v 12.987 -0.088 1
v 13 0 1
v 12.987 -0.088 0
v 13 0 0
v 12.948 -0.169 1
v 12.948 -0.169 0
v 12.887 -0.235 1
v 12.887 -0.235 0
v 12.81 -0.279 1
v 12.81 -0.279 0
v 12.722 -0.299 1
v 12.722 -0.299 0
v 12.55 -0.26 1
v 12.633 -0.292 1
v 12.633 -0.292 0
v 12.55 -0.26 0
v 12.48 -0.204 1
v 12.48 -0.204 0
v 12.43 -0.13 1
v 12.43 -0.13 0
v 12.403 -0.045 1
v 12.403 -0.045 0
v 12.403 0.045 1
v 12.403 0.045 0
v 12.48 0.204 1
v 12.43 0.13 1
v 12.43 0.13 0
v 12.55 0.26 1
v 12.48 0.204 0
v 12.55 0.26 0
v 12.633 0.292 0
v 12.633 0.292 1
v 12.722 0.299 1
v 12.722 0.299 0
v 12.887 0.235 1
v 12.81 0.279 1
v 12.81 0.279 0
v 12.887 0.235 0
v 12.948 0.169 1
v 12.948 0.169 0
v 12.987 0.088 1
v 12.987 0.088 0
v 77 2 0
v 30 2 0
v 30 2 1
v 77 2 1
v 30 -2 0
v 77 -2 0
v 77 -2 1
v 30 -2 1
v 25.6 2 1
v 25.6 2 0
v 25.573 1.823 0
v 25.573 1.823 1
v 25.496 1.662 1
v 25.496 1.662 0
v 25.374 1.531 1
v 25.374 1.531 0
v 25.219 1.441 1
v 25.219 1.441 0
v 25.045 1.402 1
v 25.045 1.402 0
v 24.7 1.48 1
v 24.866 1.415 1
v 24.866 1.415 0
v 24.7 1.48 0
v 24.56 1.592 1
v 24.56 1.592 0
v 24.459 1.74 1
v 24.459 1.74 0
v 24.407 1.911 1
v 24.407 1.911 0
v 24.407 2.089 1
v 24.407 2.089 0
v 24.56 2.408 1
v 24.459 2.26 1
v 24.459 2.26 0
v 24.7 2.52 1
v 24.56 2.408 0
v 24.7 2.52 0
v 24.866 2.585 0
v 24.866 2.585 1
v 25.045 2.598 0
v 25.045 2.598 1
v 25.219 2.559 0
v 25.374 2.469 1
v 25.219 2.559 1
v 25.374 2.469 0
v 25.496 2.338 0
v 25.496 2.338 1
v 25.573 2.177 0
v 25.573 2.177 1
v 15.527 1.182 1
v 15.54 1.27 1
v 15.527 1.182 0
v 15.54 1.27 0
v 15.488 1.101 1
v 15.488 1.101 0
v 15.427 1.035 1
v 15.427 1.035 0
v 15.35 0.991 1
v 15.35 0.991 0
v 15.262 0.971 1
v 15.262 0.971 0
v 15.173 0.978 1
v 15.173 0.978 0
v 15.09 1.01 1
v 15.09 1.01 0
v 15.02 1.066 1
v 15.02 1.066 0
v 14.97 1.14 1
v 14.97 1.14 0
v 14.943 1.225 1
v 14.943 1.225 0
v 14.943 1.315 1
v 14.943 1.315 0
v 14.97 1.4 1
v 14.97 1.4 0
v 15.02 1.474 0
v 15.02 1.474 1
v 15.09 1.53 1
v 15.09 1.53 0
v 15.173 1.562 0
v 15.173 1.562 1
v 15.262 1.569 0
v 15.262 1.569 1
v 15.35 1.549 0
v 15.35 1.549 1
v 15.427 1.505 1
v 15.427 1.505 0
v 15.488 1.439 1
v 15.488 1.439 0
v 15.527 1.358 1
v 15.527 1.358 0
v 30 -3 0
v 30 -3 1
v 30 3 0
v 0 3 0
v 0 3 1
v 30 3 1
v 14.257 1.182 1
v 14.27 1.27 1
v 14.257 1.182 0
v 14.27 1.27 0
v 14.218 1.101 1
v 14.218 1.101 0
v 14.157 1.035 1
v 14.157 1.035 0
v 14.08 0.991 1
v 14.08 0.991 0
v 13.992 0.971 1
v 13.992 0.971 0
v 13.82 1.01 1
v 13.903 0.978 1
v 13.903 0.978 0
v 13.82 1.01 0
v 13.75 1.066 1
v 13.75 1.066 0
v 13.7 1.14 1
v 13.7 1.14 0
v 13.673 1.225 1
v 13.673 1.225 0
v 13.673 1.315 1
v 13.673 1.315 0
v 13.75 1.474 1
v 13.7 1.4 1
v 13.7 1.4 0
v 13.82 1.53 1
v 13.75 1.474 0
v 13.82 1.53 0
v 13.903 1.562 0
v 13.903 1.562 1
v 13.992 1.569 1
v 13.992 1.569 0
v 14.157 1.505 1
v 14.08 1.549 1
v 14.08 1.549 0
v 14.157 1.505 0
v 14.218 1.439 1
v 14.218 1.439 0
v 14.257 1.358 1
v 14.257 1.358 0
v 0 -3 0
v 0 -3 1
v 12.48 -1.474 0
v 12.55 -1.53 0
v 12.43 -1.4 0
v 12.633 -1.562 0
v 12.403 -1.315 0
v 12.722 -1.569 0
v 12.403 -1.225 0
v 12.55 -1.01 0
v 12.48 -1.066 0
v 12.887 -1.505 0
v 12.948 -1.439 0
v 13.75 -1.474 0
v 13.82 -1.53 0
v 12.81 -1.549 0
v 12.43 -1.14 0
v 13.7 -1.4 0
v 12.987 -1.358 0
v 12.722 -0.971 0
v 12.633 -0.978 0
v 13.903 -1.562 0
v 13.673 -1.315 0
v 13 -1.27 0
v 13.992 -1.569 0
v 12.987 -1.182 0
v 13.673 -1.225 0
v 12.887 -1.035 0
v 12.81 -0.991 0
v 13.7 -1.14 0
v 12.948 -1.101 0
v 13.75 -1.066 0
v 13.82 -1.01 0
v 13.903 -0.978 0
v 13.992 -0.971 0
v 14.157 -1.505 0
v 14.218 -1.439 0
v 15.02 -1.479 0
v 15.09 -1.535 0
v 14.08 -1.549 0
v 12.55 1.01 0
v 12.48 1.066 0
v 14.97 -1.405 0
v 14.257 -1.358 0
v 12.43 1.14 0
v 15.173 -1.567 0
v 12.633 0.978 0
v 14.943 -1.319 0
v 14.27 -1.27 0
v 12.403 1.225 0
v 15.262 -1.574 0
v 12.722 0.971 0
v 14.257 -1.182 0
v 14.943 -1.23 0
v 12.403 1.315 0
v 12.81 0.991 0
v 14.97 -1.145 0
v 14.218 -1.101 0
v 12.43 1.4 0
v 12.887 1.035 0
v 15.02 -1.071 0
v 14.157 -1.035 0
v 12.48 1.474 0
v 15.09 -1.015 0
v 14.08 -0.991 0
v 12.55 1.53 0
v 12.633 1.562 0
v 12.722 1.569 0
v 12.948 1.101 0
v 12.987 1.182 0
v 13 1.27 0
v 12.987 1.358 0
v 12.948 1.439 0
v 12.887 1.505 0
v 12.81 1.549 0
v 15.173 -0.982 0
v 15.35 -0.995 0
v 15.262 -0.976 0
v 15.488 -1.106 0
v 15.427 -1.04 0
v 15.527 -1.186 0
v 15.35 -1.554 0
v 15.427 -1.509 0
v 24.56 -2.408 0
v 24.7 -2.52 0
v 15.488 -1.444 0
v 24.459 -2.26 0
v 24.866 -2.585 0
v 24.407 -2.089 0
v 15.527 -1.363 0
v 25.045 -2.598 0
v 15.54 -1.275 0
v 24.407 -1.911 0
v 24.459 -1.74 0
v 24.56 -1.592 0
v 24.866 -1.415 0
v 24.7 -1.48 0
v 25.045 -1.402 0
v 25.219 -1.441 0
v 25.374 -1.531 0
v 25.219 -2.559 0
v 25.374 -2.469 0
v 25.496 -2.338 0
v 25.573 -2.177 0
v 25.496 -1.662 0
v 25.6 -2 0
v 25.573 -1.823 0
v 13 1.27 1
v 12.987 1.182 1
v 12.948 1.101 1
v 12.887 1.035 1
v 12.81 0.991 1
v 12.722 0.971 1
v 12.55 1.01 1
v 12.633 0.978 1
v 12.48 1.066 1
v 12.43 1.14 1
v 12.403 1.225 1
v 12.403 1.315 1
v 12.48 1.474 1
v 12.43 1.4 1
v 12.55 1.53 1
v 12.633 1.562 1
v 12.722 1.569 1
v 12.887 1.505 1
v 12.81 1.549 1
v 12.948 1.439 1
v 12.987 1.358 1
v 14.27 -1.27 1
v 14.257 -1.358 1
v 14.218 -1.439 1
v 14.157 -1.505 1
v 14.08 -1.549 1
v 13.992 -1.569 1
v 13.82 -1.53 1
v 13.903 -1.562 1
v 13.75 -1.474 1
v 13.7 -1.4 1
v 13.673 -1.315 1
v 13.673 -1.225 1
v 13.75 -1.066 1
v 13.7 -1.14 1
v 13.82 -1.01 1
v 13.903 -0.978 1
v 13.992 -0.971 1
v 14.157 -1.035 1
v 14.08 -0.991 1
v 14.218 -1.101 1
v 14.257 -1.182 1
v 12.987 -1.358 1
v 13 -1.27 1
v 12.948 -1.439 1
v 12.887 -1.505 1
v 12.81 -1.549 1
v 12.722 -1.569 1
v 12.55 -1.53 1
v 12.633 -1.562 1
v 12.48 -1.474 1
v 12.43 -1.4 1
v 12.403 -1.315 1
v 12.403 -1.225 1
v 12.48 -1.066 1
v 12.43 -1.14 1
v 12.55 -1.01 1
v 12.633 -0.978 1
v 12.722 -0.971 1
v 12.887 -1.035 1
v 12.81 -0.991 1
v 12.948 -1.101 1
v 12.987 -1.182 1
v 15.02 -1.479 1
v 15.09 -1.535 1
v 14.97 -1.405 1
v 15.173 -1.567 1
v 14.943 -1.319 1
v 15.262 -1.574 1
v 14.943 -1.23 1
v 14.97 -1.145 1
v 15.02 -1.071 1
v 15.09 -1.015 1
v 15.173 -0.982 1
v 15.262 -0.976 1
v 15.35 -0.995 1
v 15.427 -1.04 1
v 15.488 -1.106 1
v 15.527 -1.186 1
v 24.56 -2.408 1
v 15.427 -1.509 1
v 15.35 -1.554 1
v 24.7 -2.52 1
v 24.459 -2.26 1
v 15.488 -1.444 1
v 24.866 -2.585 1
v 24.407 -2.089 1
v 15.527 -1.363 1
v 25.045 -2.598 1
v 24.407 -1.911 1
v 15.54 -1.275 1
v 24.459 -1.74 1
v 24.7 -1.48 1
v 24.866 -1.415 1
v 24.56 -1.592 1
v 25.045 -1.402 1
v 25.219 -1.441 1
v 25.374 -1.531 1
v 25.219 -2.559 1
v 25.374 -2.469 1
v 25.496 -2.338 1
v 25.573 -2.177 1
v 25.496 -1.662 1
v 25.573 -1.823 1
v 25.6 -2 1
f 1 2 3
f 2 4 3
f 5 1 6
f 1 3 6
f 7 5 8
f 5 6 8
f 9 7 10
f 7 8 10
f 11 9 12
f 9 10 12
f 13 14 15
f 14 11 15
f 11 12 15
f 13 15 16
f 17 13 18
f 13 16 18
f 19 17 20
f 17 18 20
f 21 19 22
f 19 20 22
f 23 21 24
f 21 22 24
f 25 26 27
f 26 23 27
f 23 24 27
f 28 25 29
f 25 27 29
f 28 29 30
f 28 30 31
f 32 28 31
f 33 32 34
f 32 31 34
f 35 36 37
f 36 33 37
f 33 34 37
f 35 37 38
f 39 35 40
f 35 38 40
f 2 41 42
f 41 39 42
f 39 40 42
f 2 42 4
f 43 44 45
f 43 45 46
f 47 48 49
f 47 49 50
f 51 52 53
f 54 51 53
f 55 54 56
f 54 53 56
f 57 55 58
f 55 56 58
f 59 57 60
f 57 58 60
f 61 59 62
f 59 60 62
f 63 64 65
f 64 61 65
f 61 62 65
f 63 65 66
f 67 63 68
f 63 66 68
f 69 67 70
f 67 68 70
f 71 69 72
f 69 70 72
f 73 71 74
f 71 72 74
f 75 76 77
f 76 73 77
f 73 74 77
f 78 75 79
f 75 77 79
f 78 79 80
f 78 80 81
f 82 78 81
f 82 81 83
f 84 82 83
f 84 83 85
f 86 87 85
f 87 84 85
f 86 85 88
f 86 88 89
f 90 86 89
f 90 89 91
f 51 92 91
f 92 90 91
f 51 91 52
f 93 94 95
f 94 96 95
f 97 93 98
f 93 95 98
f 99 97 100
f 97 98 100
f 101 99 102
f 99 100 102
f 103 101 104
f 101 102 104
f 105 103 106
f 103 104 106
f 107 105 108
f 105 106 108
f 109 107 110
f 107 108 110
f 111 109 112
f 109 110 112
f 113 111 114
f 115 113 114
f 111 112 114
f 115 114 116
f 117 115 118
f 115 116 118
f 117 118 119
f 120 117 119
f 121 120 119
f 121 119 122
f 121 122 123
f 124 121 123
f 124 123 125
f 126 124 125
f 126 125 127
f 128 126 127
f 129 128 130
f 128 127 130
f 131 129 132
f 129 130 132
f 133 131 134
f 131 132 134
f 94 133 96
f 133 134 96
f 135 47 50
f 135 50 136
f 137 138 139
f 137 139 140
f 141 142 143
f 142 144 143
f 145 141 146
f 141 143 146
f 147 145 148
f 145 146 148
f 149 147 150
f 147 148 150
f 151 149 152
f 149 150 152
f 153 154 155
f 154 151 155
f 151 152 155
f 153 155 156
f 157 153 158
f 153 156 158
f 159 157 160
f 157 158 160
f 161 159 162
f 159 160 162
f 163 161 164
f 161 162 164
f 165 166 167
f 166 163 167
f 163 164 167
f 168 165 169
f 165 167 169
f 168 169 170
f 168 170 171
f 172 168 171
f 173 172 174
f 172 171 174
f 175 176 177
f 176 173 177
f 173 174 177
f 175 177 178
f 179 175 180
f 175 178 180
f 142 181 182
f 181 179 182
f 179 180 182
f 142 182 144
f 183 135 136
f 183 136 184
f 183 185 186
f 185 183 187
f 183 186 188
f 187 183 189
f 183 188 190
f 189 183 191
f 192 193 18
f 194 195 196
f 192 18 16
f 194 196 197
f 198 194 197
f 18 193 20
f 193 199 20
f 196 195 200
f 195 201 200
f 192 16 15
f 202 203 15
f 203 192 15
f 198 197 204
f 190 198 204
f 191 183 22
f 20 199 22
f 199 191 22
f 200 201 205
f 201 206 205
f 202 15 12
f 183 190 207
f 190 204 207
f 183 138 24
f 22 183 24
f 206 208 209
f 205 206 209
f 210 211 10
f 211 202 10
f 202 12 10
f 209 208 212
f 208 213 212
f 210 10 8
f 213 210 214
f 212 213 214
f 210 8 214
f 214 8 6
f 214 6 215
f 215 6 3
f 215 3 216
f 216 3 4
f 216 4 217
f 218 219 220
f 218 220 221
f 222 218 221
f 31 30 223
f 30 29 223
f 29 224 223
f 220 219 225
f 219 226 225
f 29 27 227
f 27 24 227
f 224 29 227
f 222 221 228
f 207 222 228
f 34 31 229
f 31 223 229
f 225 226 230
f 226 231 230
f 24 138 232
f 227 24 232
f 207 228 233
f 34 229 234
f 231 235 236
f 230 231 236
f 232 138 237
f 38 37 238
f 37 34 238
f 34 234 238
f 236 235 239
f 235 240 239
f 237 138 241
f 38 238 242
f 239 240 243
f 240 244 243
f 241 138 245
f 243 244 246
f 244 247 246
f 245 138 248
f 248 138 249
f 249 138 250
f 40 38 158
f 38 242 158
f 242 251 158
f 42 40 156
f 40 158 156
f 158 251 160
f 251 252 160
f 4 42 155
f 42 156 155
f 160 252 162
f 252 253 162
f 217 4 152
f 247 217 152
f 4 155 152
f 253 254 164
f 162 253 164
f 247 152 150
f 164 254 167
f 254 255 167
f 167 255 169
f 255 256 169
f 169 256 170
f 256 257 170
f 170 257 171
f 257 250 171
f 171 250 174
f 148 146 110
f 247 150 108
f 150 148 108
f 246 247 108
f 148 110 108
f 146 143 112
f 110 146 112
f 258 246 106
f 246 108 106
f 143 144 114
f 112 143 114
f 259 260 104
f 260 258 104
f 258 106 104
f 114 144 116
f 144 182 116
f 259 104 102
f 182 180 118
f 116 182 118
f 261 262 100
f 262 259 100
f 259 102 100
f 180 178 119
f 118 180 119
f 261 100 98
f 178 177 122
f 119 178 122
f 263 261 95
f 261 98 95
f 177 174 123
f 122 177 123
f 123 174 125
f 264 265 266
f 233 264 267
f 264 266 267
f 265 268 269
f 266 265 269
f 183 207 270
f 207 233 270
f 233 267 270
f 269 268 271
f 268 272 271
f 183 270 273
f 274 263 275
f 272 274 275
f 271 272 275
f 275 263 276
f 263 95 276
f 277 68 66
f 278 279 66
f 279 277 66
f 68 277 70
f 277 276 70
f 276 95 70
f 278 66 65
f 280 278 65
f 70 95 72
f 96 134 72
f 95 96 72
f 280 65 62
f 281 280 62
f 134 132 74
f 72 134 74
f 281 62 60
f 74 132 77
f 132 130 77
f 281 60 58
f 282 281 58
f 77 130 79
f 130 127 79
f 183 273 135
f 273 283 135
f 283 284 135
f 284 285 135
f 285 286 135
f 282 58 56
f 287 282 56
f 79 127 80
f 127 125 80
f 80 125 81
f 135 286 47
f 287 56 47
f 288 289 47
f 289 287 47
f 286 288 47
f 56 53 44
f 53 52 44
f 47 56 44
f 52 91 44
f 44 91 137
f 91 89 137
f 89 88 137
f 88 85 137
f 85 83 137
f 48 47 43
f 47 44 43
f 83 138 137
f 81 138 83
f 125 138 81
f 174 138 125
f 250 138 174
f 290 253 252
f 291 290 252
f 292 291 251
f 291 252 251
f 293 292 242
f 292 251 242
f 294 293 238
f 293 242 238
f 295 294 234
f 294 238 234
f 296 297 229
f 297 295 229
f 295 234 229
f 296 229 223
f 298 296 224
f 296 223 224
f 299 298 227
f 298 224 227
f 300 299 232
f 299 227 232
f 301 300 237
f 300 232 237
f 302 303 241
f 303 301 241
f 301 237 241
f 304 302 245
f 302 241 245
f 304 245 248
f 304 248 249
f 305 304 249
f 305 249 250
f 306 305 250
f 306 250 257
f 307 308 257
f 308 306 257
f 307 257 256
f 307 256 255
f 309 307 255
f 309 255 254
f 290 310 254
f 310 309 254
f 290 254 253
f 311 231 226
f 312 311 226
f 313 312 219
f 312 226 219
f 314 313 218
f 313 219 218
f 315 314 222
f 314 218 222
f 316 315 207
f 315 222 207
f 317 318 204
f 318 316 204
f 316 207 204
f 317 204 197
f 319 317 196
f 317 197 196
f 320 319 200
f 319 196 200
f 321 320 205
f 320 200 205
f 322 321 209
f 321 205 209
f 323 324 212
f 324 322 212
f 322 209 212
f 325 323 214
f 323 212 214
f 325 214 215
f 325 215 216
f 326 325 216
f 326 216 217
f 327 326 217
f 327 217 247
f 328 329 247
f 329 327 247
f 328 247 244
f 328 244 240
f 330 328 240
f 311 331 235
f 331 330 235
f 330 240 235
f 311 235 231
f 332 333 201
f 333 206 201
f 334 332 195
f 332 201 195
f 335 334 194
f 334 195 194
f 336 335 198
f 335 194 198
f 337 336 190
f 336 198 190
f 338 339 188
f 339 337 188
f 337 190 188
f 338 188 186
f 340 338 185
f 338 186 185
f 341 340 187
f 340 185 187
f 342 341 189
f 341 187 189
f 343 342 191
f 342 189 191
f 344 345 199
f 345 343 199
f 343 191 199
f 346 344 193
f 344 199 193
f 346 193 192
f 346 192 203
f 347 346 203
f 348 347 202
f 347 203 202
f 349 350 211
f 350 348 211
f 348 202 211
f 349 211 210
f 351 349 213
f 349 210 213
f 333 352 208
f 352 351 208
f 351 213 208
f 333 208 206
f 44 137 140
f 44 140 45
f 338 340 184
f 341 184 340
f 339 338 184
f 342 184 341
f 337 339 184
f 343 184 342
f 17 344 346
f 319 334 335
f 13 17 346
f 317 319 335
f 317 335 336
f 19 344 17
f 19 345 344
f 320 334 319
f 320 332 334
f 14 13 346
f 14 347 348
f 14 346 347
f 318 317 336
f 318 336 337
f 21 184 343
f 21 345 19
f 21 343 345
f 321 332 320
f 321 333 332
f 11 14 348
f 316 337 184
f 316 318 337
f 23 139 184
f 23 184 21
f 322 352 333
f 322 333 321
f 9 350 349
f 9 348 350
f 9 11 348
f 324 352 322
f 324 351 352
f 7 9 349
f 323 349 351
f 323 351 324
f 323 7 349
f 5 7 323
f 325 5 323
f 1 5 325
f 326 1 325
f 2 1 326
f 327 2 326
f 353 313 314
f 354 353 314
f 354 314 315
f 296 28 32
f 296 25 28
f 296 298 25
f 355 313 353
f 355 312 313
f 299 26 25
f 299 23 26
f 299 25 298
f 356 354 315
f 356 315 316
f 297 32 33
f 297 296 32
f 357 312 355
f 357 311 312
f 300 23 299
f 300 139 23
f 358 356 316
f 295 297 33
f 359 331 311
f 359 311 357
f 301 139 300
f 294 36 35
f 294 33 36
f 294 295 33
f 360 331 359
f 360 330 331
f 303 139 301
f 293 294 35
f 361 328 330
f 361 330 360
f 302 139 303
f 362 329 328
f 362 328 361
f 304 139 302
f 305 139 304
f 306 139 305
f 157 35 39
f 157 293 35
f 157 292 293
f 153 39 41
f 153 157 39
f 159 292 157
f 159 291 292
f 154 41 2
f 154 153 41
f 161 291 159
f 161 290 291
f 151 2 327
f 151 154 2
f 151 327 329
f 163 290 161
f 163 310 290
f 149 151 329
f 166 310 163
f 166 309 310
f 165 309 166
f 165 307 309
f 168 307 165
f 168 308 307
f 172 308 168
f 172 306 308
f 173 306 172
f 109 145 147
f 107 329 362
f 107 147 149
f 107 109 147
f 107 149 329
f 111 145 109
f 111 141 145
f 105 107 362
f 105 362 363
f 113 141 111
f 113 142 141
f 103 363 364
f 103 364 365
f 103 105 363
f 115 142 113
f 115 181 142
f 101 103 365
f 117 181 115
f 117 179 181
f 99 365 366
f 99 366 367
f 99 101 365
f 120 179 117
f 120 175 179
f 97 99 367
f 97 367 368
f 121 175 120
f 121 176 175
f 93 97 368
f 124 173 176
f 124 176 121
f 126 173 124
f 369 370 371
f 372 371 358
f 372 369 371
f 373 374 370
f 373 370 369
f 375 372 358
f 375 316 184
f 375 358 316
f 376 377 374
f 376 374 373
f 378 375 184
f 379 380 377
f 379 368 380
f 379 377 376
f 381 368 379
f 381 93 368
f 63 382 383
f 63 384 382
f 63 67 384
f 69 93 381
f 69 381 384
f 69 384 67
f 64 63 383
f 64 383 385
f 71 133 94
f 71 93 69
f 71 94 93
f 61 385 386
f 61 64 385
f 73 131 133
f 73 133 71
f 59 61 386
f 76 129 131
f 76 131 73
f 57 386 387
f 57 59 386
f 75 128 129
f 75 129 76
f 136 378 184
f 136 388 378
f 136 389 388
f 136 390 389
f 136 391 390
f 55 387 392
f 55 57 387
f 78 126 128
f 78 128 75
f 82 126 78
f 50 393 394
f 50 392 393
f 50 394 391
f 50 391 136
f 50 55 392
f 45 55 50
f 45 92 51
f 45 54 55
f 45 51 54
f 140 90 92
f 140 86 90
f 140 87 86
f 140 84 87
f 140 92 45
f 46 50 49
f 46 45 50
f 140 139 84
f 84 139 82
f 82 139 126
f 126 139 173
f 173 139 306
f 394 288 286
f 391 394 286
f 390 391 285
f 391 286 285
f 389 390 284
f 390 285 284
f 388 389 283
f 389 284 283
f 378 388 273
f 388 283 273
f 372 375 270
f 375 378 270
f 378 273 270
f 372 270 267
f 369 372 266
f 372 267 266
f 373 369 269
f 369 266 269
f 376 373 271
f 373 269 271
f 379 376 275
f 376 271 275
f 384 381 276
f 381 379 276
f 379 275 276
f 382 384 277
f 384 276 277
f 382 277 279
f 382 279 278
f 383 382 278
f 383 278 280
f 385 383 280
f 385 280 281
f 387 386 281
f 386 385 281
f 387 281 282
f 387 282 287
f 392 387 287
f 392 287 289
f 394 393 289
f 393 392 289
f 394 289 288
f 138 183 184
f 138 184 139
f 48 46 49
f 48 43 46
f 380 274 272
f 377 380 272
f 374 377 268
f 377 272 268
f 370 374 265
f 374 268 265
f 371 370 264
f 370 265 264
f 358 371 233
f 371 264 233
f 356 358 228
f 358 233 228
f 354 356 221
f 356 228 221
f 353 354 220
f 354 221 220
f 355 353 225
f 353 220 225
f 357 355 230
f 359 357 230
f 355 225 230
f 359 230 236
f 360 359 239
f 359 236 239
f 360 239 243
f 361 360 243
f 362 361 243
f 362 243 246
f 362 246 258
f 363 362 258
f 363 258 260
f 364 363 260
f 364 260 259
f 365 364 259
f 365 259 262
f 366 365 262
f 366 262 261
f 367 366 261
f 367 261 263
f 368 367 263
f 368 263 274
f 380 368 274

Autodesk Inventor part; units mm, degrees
ref_plane "YZ Plane" through (0, 0, 0) normal (1, 0, 0) x (0, 1, 0)
ref_plane "XZ Plane" through (0, 0, 0) normal (0, 1, 0) x (-1, 0, 0)
ref_plane "XY Plane" through (0, 0, 0) normal (0, 0, 1) x (1, 0, 0)
sketch "Skizze1" plane through (0, 0, 0) normal (0, 0, 1) x (1, 0, 0)
  line L0 (0, 3) -> (30, 3)
  arc A0 (30, 2.9625) -> (30, 3.0375) centre (30, 3) ccw
  arc A1 (0, 3.0375) -> (0, 2.9625) centre (0, 3) ccw
  line L1 (30, 3) -> (30, 2)
  line L2 (30, 2) -> (77, 2)
  line L3 (77, 2) -> (77, -2)
  line L4 (77, -2) -> (30, -2)
  line L5 (30, -2) -> (30, -3)
  line L6 (0, -3) -> (0, 3)
  circle A2 centre (25, -2) radius 0.6
  line L7 (30, -3) -> (0, -3)
  arc A3 (0, -3.0325) -> (0, -2.9675) centre (0, -3) ccw
  arc A4 (0, 2.9675) -> (0, 3.0325) centre (0, 3) ccw
  arc A5 (-0.0325, 3) -> (0.0325, 3) centre (0, 3) ccw
  arc A6 (29.9675, 3) -> (30.0325, 3) centre (30, 3) ccw
  arc A7 (29.9675, 2) -> (30.0325, 2) centre (30, 2) ccw
  arc A8 (76.9675, 2) -> (77.0325, 2) centre (77, 2) ccw
  arc A9 (77, 2.0325) -> (77, 1.9675) centre (77, 2) ccw
  arc A10 (77, -1.9675) -> (77, -2.0325) centre (77, -2) ccw
  arc A11 (30, -1.9675) -> (30, -2.0325) centre (30, -2) ccw
  arc A12 (30, -2.9675) -> (30, -3.0325) centre (30, -3) ccw
  circle A13 centre (25, 2) radius 0.6
  arc A14 (25, 1.6492) -> (25, 2.3508) centre (25, 2) ccw
  arc A15 (25, 2.3508) -> (25, 1.6492) centre (25, 2) ccw
  arc A16 (25, -2.3508) -> (25, -1.6492) centre (25, -2) ccw
  arc A17 (25, -1.6492) -> (25, -2.3508) centre (25, -2) ccw
  arc A18 (25, 1.6492) -> (25, 2.3508) centre (25, 2) ccw
  arc A19 (25, 2.3508) -> (25, 1.6492) centre (25, 2) ccw
  arc A20 (25, -2.3508) -> (25, -1.6492) centre (25, -2) ccw
  arc A21 (25, -1.6492) -> (25, -2.3508) centre (25, -2) ccw
  circle A22 centre (12.7, 1.27) radius 0.3
  circle A23 centre (12.7, 0) radius 0.3
  circle A24 centre (12.7, -1.27) radius 0.3
  circle A25 centre (13.97, 1.27) radius 0.3
  circle A26 centre (13.97, -1.27) radius 0.3
  arc A27 (35.0325, 0) -> (34.9675, 0) centre (35, 0) ccw
  arc A28 (72.0325, 0) -> (71.9675, 0) centre (72, 0) ccw
  arc A29 (35.0325, 0) -> (34.9675, 0) centre (35, 0) ccw
  arc A30 (30.0325, -2) -> (29.9675, -2) centre (30, -2) ccw
  line L8 (35, 0) -> (72, 0)
  line L9 (12.1968, -0.5032) -> (13.2032, -0.5032)
  line L10 (13.2032, -0.5032) -> (13.2032, 0.5032)
  line L11 (13.2032, 0.5032) -> (12.1968, 0.5032)
  line L12 (12.1968, 0.5032) -> (12.1968, -0.5032)
  line L13 (12.1968, -0.5032) -> (13.2032, -0.5032)
  line L14 (13.2032, -0.5032) -> (13.2032, 0.5032)
  line L15 (13.2032, 0.5032) -> (12.1968, 0.5032)
  line L16 (12.1968, 0.5032) -> (12.1968, -0.5032)
  line L17 (12.0952, -0.6048) -> (13.3048, -0.6048)
  line L18 (13.3048, -0.6048) -> (13.3048, 0.6048)
  line L19 (13.3048, 0.6048) -> (12.0952, 0.6048)
  line L20 (12.0952, 0.6048) -> (12.0952, -0.6048)
  line L21 (12.0952, -0.6048) -> (13.3048, -0.6048)
  line L22 (13.3048, -0.6048) -> (13.3048, 0.6048)
  line L23 (13.3048, 0.6048) -> (12.0952, 0.6048)
  line L24 (12.0952, 0.6048) -> (12.0952, -0.6048)
  line L25 (12.1968, -1.7732) -> (13.2032, -1.7732)
  line L26 (13.2032, -1.7732) -> (13.2032, -0.7668)
  line L27 (13.2032, -0.7668) -> (12.1968, -0.7668)
  line L28 (12.1968, -0.7668) -> (12.1968, -1.7732)
  line L29 (12.1968, -1.7732) -> (13.2032, -1.7732)
  line L30 (13.2032, -1.7732) -> (13.2032, -0.7668)
  line L31 (13.2032, -0.7668) -> (12.1968, -0.7668)
  line L32 (12.1968, -0.7668) -> (12.1968, -1.7732)
  line L33 (12.0952, -1.8748) -> (13.3048, -1.8748)
  line L34 (13.3048, -1.8748) -> (13.3048, -0.6652)
  line L35 (13.3048, -0.6652) -> (12.0952, -0.6652)
  line L36 (12.0952, -0.6652) -> (12.0952, -1.8748)
  line L37 (12.0952, -1.8748) -> (13.3048, -1.8748)
  line L38 (13.3048, -1.8748) -> (13.3048, -0.6652)
  line L39 (13.3048, -0.6652) -> (12.0952, -0.6652)
  line L40 (12.0952, -0.6652) -> (12.0952, -1.8748)
  line L41 (13.4668, 0.7668) -> (14.4732, 0.7668)
  line L42 (14.4732, 0.7668) -> (14.4732, 1.7732)
  line L43 (14.4732, 1.7732) -> (13.4668, 1.7732)
  line L44 (13.4668, 1.7732) -> (13.4668, 0.7668)
  line L45 (13.4668, 0.7668) -> (14.4732, 0.7668)
  line L46 (14.4732, 0.7668) -> (14.4732, 1.7732)
  line L47 (14.4732, 1.7732) -> (13.4668, 1.7732)
  line L48 (13.4668, 1.7732) -> (13.4668, 0.7668)
  line L49 (13.3652, 0.6652) -> (14.5748, 0.6652)
  line L50 (14.5748, 0.6652) -> (14.5748, 1.8748)
  line L51 (14.5748, 1.8748) -> (13.3652, 1.8748)
  line L52 (13.3652, 1.8748) -> (13.3652, 0.6652)
  line L53 (13.3652, 0.6652) -> (14.5748, 0.6652)
  line L54 (14.5748, 0.6652) -> (14.5748, 1.8748)
  line L55 (14.5748, 1.8748) -> (13.3652, 1.8748)
  line L56 (13.3652, 1.8748) -> (13.3652, 0.6652)
  line L57 (13.4668, -1.7732) -> (14.4732, -1.7732)
  line L58 (14.4732, -1.7732) -> (14.4732, -0.7668)
  line L59 (14.4732, -0.7668) -> (13.4668, -0.7668)
  line L60 (13.4668, -0.7668) -> (13.4668, -1.7732)
  line L61 (13.4668, -1.7732) -> (14.4732, -1.7732)
  line L62 (14.4732, -1.7732) -> (14.4732, -0.7668)
  line L63 (14.4732, -0.7668) -> (13.4668, -0.7668)
  line L64 (13.4668, -0.7668) -> (13.4668, -1.7732)
  line L65 (13.3652, -1.8748) -> (14.5748, -1.8748)
  line L66 (14.5748, -1.8748) -> (14.5748, -0.6652)
  line L67 (14.5748, -0.6652) -> (13.3652, -0.6652)
  line L68 (13.3652, -0.6652) -> (13.3652, -1.8748)
  line L69 (13.3652, -1.8748) -> (14.5748, -1.8748)
  line L70 (14.5748, -1.8748) -> (14.5748, -0.6652)
  line L71 (14.5748, -0.6652) -> (13.3652, -0.6652)
  line L72 (13.3652, -0.6652) -> (13.3652, -1.8748)
  line L73 (12.1968, 0.7668) -> (13.2032, 0.7668)
  line L74 (13.2032, 0.7668) -> (13.2032, 1.7732)
  line L75 (13.2032, 1.7732) -> (12.1968, 1.7732)
  line L76 (12.1968, 1.7732) -> (12.1968, 0.7668)
  line L77 (12.1968, 0.7668) -> (13.2032, 0.7668)
  line L78 (13.2032, 0.7668) -> (13.2032, 1.7732)
  line L79 (13.2032, 1.7732) -> (12.1968, 1.7732)
  line L80 (12.1968, 1.7732) -> (12.1968, 0.7668)
  line L81 (12.0952, 0.6652) -> (13.3048, 0.6652)
  line L82 (13.3048, 0.6652) -> (13.3048, 1.8748)
  line L83 (13.3048, 1.8748) -> (12.0952, 1.8748)
  line L84 (12.0952, 1.8748) -> (12.0952, 0.6652)
  line L85 (12.0952, 0.6652) -> (13.3048, 0.6652)
  line L86 (13.3048, 0.6652) -> (13.3048, 1.8748)
  line L87 (13.3048, 1.8748) -> (12.0952, 1.8748)
  line L88 (12.0952, 1.8748) -> (12.0952, 0.6652)
  line L89 (0, 3) -> (30, 3)
  line L90 (30, 3) -> (30, -3)
  line L91 (30, -3) -> (0, -3)
  line L92 (0, -3) -> (0, 3)
  line L93 (30, 2) -> (77, 2)
  line L94 (77, 2) -> (77, -2)
  line L95 (77, -2) -> (30, -2)
  line L96 (30, -2) -> (30, 2)
  line L97 (14.7384, 0.7621) -> (15.7448, 0.7621)
  line L98 (15.7448, 0.7621) -> (15.7448, 1.7685)
  line L99 (15.7448, 1.7685) -> (14.7384, 1.7685)
  line L100 (14.7384, 1.7685) -> (14.7384, 0.7621)
  line L101 (14.7384, 0.7621) -> (15.7448, 0.7621)
  line L102 (15.7448, 0.7621) -> (15.7448, 1.7685)
  line L103 (15.7448, 1.7685) -> (14.7384, 1.7685)
  line L104 (14.6368, 0.6605) -> (15.8464, 0.6605)
  line L105 (15.8464, 0.6605) -> (15.8464, 1.8701)
  line L106 (15.8464, 1.8701) -> (14.6368, 1.8701)
  line L107 (14.6368, 0.6605) -> (15.8464, 0.6605)
  line L108 (15.8464, 0.6605) -> (15.8464, 1.8701)
  line L109 (15.8464, 1.8701) -> (14.6368, 1.8701)
  line L110 (14.6368, 1.8701) -> (14.6368, 0.6605)
  line L111 (14.7384, -1.7779) -> (15.7448, -1.7779)
  line L112 (15.7448, -1.7779) -> (15.7448, -0.7715)
  line L113 (15.7448, -0.7715) -> (14.7384, -0.7715)
  line L114 (14.7384, -1.7779) -> (15.7448, -1.7779)
  line L115 (15.7448, -1.7779) -> (15.7448, -0.7715)
  line L116 (15.7448, -0.7715) -> (14.7384, -0.7715)
  line L117 (14.7384, -0.7715) -> (14.7384, -1.7779)
  line L118 (14.6368, -1.8795) -> (15.8464, -1.8795)
  line L119 (15.8464, -1.8795) -> (15.8464, -0.6699)
  line L120 (15.8464, -0.6699) -> (14.6368, -0.6699)
  line L121 (14.6368, -1.8795) -> (15.8464, -1.8795)
  line L122 (15.8464, -1.8795) -> (15.8464, -0.6699)
  line L123 (15.8464, -0.6699) -> (14.6368, -0.6699)
  line L124 (14.6368, -0.6699) -> (14.6368, -1.8795)
  circle A31 centre (15.24, 1.27) radius 0.3
  circle A32 centre (15.24, -1.2747) radius 0.3
  point P0 (0, 0)
  dimension "d11" = 0.6
  dimension "d12" = 0.6
  dimension "d13" = 0.6
extrude "Extrusion1" add sketch "Skizze1" along normal blind 1 contours L0 A4 L6 | L0 A6 L1 L90 A11 L5 A12 L7 A3 L6 A4 | L0 L1 A6 | A3 L7 L6 | A12 L5 L7 | L90 L5 A11 | L12 L11 L10 L9 | L20 L19 L18 L17 | L28 L27 L26 L25 | L36 L35 L34 L33 | L44 L43 L42 L41 | L52 L51 L50 L49 | L60 L59 L58 L57 | L68 L67 L66 L65 | L76 L75 L74 L73 | L84 L83 L82 L81 | L100 L99 L98 L97 | L110 L106 L105 L104 | L117 L113 L112 L111 | L124 L120 L119 L118 | A31 | A32
extrude "Extrusion4" add sketch "Skizze1" along normal blind 1 contours L2 A7 L90 | L2 A8 L3 A10 L4 A30 L90 A7 | L2 L3 A8 | A30 L4 L90 | L3 L4 A10
extrude "Extrusion5" cut sketch "Skizze1" along normal blind 10 contours A31 | A32
properties part number "PCB"
